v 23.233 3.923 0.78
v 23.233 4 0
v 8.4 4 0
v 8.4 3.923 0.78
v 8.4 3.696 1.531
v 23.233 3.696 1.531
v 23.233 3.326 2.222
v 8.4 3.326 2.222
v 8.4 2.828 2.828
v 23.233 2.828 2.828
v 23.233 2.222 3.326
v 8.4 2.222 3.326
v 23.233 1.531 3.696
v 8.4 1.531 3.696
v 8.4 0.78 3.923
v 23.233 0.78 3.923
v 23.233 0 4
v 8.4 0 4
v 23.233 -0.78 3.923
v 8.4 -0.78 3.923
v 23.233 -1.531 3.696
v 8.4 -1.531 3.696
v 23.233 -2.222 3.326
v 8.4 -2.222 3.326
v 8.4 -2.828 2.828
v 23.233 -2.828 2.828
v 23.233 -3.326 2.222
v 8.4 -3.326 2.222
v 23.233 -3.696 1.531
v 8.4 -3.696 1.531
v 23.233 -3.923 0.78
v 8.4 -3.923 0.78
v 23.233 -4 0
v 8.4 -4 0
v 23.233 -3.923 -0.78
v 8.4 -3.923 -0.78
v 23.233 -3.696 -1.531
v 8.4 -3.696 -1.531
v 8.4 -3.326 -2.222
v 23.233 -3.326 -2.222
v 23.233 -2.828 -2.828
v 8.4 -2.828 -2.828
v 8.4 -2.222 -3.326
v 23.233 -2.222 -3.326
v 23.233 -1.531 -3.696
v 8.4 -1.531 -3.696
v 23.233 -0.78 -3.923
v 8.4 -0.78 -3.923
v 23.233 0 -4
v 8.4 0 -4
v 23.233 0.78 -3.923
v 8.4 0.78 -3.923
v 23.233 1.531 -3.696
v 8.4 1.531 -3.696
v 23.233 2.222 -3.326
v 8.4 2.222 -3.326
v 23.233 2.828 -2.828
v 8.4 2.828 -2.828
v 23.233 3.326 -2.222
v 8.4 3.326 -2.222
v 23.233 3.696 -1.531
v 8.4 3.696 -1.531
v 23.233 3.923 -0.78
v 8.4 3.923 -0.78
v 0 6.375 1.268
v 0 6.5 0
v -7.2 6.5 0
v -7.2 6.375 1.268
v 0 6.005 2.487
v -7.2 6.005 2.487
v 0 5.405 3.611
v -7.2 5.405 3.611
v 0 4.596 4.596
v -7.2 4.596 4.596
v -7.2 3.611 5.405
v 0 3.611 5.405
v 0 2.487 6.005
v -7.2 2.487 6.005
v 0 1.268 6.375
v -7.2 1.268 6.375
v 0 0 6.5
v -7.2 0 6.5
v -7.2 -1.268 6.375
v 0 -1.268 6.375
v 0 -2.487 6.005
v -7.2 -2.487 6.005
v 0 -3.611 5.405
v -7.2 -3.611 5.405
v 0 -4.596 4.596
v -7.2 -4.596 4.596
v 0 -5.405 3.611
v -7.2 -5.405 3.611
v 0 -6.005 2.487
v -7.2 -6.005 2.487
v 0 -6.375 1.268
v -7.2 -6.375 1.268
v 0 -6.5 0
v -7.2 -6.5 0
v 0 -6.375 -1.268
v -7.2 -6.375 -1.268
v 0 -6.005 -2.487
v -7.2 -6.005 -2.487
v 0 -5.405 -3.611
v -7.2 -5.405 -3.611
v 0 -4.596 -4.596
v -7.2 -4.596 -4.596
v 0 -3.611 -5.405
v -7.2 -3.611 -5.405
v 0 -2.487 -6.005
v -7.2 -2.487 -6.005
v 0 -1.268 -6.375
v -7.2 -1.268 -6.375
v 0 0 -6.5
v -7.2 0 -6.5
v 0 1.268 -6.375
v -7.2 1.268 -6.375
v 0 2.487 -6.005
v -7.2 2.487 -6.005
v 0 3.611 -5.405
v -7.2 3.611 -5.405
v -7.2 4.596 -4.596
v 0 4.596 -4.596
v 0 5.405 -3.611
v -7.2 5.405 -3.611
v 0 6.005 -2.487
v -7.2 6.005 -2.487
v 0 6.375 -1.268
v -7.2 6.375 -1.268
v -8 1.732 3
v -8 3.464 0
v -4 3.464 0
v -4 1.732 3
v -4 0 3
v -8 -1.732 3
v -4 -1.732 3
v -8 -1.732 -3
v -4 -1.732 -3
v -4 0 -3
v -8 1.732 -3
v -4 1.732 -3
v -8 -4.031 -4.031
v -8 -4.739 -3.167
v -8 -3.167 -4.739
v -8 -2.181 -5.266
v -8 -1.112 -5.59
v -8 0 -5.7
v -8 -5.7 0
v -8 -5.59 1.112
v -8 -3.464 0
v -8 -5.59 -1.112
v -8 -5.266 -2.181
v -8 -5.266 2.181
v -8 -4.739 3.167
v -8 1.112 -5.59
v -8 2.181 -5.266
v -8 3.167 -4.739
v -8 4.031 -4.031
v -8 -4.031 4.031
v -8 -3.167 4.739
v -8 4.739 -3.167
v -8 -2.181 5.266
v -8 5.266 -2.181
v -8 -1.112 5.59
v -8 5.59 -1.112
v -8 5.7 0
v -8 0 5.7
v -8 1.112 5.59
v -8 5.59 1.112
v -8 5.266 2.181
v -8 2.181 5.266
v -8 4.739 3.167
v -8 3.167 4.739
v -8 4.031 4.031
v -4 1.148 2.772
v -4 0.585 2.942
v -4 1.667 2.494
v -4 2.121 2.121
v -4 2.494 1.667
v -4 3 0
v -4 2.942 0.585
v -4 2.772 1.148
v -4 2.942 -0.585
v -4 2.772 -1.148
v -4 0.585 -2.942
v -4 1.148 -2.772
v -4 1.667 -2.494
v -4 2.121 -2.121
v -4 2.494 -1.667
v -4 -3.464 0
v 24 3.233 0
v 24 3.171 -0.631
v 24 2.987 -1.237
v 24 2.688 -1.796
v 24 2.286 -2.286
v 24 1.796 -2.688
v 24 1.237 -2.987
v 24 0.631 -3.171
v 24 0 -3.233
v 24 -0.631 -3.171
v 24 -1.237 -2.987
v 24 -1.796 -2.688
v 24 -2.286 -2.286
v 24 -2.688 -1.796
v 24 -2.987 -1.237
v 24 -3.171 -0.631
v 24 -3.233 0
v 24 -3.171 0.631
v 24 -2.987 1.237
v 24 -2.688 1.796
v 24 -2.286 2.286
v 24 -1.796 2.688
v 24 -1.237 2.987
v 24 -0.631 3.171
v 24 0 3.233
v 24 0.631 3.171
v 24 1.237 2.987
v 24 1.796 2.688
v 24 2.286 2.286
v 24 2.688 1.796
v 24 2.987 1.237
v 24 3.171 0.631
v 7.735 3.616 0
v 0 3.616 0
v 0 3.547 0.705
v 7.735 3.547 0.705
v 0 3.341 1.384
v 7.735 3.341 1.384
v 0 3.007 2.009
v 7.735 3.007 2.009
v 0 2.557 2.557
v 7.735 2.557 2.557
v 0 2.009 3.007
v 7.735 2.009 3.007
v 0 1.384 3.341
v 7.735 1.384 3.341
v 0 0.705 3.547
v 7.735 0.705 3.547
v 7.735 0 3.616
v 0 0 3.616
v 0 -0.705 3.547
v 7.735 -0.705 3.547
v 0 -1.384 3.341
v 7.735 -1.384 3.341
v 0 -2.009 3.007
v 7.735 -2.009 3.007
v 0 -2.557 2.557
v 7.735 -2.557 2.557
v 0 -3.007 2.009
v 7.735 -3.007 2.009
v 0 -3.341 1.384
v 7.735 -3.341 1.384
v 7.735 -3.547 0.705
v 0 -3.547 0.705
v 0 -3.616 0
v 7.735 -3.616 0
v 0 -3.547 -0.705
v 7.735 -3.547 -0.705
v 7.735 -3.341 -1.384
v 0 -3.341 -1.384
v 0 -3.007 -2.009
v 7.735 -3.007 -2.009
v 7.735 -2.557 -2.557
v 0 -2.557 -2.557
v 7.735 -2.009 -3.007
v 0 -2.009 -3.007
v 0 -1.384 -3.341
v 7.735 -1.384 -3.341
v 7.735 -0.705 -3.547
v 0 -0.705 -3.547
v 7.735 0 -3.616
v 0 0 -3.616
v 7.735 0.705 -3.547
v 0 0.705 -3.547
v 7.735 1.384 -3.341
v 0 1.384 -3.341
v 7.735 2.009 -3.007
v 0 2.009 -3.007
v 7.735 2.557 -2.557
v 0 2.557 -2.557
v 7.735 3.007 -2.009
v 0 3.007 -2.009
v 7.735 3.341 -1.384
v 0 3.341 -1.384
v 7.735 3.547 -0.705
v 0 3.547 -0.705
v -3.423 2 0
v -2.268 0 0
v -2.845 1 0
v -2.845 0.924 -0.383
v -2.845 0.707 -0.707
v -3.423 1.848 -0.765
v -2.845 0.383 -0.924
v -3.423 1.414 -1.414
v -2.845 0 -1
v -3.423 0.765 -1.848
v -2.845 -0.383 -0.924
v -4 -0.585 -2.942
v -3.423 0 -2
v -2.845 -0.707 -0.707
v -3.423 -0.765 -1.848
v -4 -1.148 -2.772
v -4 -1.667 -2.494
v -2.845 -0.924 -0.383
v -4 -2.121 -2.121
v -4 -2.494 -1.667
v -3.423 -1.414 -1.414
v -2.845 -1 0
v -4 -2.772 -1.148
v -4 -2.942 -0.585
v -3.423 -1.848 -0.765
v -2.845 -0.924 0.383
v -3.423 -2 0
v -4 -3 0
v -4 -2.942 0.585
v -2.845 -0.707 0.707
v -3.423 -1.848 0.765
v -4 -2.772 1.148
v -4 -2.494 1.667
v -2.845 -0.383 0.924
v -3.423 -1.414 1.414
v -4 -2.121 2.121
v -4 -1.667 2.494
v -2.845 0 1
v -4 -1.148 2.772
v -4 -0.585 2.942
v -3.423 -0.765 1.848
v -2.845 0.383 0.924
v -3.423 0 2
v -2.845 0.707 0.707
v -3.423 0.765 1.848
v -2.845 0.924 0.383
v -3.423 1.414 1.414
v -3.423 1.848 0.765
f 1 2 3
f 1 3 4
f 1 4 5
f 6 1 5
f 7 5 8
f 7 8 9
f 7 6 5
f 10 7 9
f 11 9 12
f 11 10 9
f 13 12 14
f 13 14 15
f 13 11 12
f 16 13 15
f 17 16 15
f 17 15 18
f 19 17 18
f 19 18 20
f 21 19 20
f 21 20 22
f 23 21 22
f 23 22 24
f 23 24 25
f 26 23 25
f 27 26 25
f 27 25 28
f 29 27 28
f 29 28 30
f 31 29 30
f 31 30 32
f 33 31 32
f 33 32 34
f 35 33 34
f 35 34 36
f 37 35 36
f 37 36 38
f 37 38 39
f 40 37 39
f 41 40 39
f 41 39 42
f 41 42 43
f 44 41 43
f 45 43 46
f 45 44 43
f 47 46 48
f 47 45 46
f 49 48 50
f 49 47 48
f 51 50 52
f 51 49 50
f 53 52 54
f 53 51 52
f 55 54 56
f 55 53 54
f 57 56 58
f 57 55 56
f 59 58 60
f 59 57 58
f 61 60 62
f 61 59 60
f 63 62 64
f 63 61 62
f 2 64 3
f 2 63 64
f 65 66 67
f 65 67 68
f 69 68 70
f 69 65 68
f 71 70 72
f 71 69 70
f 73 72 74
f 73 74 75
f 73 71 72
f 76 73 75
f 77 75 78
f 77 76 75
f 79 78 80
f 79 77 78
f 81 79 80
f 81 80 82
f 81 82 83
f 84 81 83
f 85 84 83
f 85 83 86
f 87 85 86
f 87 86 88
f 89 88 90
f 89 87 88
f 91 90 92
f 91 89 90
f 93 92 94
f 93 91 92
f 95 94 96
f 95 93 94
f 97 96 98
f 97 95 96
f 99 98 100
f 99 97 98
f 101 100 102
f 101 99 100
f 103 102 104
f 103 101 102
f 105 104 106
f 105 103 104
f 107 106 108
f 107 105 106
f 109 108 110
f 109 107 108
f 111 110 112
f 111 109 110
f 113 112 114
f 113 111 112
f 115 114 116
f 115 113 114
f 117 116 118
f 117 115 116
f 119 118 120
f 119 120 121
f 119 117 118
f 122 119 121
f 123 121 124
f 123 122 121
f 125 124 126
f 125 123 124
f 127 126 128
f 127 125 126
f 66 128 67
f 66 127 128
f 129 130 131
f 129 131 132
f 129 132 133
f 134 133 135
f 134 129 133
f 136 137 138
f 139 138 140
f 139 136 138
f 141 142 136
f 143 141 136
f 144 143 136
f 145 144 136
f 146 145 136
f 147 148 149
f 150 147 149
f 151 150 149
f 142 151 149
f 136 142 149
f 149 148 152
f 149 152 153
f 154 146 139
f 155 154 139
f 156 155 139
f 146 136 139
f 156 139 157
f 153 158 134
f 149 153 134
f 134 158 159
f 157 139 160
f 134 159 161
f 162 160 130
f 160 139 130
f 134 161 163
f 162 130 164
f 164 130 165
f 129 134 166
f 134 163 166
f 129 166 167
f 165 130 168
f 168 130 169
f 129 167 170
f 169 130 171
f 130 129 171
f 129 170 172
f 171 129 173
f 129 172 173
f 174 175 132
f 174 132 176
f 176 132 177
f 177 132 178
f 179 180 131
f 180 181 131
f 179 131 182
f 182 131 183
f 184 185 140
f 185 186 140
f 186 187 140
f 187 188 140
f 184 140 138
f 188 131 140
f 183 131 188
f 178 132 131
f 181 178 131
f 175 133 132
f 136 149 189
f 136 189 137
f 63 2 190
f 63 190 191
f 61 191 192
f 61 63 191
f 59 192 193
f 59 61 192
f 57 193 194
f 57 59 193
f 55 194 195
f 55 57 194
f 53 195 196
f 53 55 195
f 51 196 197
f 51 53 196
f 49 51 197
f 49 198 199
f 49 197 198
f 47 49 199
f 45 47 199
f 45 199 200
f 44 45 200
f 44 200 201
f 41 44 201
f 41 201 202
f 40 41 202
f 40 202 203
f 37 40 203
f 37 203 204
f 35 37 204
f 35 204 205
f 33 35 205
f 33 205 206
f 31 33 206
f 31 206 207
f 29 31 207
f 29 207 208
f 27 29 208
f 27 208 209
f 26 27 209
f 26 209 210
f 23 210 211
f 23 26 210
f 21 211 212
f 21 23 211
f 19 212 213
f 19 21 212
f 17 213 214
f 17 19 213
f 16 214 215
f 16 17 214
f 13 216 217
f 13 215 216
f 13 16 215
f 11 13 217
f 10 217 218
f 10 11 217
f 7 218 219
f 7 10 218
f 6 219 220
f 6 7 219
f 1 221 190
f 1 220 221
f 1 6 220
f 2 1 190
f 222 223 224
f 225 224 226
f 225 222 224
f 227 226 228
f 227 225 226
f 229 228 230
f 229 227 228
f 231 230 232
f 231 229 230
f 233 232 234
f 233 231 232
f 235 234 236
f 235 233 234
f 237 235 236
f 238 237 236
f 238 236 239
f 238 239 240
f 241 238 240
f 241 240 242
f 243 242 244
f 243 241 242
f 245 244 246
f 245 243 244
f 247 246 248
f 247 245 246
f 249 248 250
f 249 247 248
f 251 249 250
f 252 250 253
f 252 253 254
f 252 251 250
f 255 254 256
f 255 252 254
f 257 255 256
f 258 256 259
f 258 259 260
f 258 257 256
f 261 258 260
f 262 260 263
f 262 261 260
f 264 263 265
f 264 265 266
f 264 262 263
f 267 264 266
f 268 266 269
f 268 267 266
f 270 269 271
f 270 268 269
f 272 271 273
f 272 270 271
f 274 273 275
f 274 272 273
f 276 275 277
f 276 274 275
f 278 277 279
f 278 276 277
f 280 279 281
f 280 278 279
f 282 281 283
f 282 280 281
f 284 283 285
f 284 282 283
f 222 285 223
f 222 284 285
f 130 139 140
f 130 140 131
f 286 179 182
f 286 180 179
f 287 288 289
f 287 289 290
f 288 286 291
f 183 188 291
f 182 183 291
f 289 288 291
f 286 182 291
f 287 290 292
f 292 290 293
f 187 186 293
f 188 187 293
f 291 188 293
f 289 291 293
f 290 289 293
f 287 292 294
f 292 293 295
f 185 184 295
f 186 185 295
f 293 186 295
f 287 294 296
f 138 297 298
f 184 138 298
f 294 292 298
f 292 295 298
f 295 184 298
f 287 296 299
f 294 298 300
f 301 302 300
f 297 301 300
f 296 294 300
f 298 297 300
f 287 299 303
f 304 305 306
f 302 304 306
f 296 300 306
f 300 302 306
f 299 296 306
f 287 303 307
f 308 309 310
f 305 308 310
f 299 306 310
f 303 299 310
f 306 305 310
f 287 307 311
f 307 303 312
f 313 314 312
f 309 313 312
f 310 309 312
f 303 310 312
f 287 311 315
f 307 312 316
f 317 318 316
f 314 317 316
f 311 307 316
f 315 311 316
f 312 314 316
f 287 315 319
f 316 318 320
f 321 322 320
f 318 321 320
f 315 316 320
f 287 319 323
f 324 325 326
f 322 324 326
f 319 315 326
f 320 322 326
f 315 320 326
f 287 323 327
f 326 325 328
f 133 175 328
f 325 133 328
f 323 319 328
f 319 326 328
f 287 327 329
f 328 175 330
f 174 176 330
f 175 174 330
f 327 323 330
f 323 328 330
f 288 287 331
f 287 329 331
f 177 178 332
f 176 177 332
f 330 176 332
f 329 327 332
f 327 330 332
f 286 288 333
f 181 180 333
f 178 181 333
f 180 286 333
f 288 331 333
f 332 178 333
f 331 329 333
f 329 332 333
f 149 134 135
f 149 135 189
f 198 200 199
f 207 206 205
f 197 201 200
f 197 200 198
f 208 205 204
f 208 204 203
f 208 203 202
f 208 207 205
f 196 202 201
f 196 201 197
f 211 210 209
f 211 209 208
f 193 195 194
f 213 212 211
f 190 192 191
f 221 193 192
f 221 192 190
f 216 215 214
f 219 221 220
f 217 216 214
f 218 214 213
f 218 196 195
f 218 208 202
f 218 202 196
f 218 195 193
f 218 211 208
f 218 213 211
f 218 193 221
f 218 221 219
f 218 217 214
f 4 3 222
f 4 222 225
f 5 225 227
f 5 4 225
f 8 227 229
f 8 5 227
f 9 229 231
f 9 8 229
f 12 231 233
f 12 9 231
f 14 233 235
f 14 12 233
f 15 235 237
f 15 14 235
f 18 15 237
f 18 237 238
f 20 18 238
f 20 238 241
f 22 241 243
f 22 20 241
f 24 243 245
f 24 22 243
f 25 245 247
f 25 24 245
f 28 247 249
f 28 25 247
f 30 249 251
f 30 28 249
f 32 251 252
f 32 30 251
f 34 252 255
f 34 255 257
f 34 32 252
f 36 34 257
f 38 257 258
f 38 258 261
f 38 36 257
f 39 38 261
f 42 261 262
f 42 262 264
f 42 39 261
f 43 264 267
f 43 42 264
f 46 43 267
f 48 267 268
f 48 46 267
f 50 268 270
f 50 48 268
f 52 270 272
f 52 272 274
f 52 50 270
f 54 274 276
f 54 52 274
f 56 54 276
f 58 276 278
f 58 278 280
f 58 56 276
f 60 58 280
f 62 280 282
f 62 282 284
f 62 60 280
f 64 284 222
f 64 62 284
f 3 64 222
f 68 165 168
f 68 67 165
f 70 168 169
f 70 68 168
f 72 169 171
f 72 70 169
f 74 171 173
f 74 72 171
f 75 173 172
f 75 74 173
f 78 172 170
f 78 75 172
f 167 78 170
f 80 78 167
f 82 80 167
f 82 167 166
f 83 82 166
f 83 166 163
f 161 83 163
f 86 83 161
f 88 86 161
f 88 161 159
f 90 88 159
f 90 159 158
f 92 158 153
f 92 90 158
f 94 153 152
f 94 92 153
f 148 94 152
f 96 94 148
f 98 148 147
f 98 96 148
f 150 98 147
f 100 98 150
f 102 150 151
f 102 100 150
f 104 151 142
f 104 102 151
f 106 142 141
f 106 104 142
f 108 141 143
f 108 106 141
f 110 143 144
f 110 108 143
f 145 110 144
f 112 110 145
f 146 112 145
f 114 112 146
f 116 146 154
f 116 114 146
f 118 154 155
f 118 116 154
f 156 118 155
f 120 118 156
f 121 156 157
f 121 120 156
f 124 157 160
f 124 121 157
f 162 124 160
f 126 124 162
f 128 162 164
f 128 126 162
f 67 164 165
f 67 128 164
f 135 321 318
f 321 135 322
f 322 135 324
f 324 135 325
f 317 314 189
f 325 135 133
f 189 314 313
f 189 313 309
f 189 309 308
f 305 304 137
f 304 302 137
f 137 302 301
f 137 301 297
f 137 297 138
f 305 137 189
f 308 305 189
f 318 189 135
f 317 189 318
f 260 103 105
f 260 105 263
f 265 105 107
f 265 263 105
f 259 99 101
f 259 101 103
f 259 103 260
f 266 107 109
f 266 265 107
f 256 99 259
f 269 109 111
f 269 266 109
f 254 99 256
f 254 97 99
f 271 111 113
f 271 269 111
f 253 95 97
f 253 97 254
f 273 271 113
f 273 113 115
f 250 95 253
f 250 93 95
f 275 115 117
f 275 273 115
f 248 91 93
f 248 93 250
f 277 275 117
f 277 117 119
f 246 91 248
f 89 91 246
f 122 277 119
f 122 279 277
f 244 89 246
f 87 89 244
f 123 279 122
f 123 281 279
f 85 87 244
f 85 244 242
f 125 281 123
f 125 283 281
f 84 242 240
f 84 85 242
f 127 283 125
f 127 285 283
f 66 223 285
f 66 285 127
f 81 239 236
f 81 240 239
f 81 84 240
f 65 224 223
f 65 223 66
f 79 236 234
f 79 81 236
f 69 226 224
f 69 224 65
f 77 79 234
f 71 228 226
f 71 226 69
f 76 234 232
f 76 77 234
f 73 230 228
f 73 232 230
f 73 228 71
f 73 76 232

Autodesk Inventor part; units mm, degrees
sketch "Sketch_6" plane through (0, 0, 0) normal (0, 0, 1) x (1, 0, 0)
  line L0 (24, 0) -> (7.0715, 0)
  line L1 (7.0715, 0) -> (7.0715, 3.233)
  line L2 (7.0715, 3.233) -> (8.4, 4)
  line L3 (8.4, 4) -> (23.233, 4)
  line L4 (23.233, 4) -> (24, 3.233)
  line L5 (24, 3.233) -> (24, 0)
  line L6 (24, 0) -> (7.0715, 0)
revolve "Revolution1" add sketch "Sketch_6" angle 360 about axis through (24, 0, 0) along (1, 0, 0)
thread "Thread1" size "M8x1.25" class "6g" standard "ISO Metric profile" full length
sketch "Sketch_1" plane through (0, 0, 0) normal (0, 0, 1) x (1, 0, 0)
  line L0 (8.4, 0) -> (-8, 0)
  line L1 (-2.2679, 0) -> (-4, 3)
  line L2 (-4, 3) -> (-8, 3)
  line L3 (-8, 3) -> (-8, 5.7)
  line L4 (-8, 5.7) -> (-7.2, 6.5)
  line L5 (-7.2, 6.5) -> (0, 6.5)
  line L6 (0, 6.5) -> (0, 3.616)
  line L7 (0, 3.616) -> (8.4, 3.616)
  line L8 (8.4, 3.616) -> (8.4, 0)
  line L9 (8.4, 0) -> (-2.2679, 0)
revolve "Revolution2" add sketch "Sketch_1" angle 360 about axis through (8.4, 0, 0) along (1, 0, 0)
sketch "Sketch_2" plane through (-8, 0, 0) normal (1, 0, 0) x (0, 0, -1)
  line L0 (-3, -1.7321) -> (0, -3.4641)
  line L1 (0, -3.4641) -> (3, -1.7321)
  line L2 (3, -1.7321) -> (3, 1.7321)
  line L3 (3, 1.7321) -> (0, 3.4641)
  line L4 (0, 3.4641) -> (-3, 1.7321)
  line L5 (-3, 1.7321) -> (-3, -1.7321)
extrude "Extrusion1" cut sketch "Sketch_2" along normal blind 4
ref_plane "bolt_to_plane_washer_XY" through (5.6, 0, 0) normal (1, 0, 0) x (0, 0, -1)
ref_plane "bolt_to_plane_washer_YZ" through (5.6, 0, 0) normal (0, 0, -1) x (0, 1, 0)
ref_plane "bolt_to_plane_washer_ZX" through (5.6, 0, 0) normal (0, 1, 0) x (1, 0, 0)
ref_plane "bolt_to_spring_washer_XY" through (2.8, 0, 0) normal (1, 0, 0) x (0, 0, -1)
ref_plane "bolt_to_spring_washer_YZ" through (2.8, 0, 0) normal (0, 0, -1) x (0, 1, 0)
ref_plane "bolt_to_spring_washer_ZX" through (2.8, 0, 0) normal (0, 1, 0) x (1, 0, 0)
ref_plane "screw_to_body_XY" through (0, 0, 0) normal (1, 0, 0) x (0, 0, -1)
ref_plane "screw_to_body_YZ" through (0, 0, 0) normal (0, 0, -1) x (0, 1, 0)
ref_plane "screw_to_body_ZX" through (0, 0, 0) normal (0, 1, 0) x (1, 0, 0)
ref_plane "to_washer_XY" through (24, 0, 0) normal (1, 0, 0) x (0, 0, -1)
ref_plane "to_washer_YZ" through (24, 0, 0) normal (0, 0, -1) x (0, 1, 0)
ref_plane "to_washer_ZX" through (24, 0, 0) normal (0, 1, 0) x (1, 0, 0)
properties part number "HCBST8-24_Screw"
